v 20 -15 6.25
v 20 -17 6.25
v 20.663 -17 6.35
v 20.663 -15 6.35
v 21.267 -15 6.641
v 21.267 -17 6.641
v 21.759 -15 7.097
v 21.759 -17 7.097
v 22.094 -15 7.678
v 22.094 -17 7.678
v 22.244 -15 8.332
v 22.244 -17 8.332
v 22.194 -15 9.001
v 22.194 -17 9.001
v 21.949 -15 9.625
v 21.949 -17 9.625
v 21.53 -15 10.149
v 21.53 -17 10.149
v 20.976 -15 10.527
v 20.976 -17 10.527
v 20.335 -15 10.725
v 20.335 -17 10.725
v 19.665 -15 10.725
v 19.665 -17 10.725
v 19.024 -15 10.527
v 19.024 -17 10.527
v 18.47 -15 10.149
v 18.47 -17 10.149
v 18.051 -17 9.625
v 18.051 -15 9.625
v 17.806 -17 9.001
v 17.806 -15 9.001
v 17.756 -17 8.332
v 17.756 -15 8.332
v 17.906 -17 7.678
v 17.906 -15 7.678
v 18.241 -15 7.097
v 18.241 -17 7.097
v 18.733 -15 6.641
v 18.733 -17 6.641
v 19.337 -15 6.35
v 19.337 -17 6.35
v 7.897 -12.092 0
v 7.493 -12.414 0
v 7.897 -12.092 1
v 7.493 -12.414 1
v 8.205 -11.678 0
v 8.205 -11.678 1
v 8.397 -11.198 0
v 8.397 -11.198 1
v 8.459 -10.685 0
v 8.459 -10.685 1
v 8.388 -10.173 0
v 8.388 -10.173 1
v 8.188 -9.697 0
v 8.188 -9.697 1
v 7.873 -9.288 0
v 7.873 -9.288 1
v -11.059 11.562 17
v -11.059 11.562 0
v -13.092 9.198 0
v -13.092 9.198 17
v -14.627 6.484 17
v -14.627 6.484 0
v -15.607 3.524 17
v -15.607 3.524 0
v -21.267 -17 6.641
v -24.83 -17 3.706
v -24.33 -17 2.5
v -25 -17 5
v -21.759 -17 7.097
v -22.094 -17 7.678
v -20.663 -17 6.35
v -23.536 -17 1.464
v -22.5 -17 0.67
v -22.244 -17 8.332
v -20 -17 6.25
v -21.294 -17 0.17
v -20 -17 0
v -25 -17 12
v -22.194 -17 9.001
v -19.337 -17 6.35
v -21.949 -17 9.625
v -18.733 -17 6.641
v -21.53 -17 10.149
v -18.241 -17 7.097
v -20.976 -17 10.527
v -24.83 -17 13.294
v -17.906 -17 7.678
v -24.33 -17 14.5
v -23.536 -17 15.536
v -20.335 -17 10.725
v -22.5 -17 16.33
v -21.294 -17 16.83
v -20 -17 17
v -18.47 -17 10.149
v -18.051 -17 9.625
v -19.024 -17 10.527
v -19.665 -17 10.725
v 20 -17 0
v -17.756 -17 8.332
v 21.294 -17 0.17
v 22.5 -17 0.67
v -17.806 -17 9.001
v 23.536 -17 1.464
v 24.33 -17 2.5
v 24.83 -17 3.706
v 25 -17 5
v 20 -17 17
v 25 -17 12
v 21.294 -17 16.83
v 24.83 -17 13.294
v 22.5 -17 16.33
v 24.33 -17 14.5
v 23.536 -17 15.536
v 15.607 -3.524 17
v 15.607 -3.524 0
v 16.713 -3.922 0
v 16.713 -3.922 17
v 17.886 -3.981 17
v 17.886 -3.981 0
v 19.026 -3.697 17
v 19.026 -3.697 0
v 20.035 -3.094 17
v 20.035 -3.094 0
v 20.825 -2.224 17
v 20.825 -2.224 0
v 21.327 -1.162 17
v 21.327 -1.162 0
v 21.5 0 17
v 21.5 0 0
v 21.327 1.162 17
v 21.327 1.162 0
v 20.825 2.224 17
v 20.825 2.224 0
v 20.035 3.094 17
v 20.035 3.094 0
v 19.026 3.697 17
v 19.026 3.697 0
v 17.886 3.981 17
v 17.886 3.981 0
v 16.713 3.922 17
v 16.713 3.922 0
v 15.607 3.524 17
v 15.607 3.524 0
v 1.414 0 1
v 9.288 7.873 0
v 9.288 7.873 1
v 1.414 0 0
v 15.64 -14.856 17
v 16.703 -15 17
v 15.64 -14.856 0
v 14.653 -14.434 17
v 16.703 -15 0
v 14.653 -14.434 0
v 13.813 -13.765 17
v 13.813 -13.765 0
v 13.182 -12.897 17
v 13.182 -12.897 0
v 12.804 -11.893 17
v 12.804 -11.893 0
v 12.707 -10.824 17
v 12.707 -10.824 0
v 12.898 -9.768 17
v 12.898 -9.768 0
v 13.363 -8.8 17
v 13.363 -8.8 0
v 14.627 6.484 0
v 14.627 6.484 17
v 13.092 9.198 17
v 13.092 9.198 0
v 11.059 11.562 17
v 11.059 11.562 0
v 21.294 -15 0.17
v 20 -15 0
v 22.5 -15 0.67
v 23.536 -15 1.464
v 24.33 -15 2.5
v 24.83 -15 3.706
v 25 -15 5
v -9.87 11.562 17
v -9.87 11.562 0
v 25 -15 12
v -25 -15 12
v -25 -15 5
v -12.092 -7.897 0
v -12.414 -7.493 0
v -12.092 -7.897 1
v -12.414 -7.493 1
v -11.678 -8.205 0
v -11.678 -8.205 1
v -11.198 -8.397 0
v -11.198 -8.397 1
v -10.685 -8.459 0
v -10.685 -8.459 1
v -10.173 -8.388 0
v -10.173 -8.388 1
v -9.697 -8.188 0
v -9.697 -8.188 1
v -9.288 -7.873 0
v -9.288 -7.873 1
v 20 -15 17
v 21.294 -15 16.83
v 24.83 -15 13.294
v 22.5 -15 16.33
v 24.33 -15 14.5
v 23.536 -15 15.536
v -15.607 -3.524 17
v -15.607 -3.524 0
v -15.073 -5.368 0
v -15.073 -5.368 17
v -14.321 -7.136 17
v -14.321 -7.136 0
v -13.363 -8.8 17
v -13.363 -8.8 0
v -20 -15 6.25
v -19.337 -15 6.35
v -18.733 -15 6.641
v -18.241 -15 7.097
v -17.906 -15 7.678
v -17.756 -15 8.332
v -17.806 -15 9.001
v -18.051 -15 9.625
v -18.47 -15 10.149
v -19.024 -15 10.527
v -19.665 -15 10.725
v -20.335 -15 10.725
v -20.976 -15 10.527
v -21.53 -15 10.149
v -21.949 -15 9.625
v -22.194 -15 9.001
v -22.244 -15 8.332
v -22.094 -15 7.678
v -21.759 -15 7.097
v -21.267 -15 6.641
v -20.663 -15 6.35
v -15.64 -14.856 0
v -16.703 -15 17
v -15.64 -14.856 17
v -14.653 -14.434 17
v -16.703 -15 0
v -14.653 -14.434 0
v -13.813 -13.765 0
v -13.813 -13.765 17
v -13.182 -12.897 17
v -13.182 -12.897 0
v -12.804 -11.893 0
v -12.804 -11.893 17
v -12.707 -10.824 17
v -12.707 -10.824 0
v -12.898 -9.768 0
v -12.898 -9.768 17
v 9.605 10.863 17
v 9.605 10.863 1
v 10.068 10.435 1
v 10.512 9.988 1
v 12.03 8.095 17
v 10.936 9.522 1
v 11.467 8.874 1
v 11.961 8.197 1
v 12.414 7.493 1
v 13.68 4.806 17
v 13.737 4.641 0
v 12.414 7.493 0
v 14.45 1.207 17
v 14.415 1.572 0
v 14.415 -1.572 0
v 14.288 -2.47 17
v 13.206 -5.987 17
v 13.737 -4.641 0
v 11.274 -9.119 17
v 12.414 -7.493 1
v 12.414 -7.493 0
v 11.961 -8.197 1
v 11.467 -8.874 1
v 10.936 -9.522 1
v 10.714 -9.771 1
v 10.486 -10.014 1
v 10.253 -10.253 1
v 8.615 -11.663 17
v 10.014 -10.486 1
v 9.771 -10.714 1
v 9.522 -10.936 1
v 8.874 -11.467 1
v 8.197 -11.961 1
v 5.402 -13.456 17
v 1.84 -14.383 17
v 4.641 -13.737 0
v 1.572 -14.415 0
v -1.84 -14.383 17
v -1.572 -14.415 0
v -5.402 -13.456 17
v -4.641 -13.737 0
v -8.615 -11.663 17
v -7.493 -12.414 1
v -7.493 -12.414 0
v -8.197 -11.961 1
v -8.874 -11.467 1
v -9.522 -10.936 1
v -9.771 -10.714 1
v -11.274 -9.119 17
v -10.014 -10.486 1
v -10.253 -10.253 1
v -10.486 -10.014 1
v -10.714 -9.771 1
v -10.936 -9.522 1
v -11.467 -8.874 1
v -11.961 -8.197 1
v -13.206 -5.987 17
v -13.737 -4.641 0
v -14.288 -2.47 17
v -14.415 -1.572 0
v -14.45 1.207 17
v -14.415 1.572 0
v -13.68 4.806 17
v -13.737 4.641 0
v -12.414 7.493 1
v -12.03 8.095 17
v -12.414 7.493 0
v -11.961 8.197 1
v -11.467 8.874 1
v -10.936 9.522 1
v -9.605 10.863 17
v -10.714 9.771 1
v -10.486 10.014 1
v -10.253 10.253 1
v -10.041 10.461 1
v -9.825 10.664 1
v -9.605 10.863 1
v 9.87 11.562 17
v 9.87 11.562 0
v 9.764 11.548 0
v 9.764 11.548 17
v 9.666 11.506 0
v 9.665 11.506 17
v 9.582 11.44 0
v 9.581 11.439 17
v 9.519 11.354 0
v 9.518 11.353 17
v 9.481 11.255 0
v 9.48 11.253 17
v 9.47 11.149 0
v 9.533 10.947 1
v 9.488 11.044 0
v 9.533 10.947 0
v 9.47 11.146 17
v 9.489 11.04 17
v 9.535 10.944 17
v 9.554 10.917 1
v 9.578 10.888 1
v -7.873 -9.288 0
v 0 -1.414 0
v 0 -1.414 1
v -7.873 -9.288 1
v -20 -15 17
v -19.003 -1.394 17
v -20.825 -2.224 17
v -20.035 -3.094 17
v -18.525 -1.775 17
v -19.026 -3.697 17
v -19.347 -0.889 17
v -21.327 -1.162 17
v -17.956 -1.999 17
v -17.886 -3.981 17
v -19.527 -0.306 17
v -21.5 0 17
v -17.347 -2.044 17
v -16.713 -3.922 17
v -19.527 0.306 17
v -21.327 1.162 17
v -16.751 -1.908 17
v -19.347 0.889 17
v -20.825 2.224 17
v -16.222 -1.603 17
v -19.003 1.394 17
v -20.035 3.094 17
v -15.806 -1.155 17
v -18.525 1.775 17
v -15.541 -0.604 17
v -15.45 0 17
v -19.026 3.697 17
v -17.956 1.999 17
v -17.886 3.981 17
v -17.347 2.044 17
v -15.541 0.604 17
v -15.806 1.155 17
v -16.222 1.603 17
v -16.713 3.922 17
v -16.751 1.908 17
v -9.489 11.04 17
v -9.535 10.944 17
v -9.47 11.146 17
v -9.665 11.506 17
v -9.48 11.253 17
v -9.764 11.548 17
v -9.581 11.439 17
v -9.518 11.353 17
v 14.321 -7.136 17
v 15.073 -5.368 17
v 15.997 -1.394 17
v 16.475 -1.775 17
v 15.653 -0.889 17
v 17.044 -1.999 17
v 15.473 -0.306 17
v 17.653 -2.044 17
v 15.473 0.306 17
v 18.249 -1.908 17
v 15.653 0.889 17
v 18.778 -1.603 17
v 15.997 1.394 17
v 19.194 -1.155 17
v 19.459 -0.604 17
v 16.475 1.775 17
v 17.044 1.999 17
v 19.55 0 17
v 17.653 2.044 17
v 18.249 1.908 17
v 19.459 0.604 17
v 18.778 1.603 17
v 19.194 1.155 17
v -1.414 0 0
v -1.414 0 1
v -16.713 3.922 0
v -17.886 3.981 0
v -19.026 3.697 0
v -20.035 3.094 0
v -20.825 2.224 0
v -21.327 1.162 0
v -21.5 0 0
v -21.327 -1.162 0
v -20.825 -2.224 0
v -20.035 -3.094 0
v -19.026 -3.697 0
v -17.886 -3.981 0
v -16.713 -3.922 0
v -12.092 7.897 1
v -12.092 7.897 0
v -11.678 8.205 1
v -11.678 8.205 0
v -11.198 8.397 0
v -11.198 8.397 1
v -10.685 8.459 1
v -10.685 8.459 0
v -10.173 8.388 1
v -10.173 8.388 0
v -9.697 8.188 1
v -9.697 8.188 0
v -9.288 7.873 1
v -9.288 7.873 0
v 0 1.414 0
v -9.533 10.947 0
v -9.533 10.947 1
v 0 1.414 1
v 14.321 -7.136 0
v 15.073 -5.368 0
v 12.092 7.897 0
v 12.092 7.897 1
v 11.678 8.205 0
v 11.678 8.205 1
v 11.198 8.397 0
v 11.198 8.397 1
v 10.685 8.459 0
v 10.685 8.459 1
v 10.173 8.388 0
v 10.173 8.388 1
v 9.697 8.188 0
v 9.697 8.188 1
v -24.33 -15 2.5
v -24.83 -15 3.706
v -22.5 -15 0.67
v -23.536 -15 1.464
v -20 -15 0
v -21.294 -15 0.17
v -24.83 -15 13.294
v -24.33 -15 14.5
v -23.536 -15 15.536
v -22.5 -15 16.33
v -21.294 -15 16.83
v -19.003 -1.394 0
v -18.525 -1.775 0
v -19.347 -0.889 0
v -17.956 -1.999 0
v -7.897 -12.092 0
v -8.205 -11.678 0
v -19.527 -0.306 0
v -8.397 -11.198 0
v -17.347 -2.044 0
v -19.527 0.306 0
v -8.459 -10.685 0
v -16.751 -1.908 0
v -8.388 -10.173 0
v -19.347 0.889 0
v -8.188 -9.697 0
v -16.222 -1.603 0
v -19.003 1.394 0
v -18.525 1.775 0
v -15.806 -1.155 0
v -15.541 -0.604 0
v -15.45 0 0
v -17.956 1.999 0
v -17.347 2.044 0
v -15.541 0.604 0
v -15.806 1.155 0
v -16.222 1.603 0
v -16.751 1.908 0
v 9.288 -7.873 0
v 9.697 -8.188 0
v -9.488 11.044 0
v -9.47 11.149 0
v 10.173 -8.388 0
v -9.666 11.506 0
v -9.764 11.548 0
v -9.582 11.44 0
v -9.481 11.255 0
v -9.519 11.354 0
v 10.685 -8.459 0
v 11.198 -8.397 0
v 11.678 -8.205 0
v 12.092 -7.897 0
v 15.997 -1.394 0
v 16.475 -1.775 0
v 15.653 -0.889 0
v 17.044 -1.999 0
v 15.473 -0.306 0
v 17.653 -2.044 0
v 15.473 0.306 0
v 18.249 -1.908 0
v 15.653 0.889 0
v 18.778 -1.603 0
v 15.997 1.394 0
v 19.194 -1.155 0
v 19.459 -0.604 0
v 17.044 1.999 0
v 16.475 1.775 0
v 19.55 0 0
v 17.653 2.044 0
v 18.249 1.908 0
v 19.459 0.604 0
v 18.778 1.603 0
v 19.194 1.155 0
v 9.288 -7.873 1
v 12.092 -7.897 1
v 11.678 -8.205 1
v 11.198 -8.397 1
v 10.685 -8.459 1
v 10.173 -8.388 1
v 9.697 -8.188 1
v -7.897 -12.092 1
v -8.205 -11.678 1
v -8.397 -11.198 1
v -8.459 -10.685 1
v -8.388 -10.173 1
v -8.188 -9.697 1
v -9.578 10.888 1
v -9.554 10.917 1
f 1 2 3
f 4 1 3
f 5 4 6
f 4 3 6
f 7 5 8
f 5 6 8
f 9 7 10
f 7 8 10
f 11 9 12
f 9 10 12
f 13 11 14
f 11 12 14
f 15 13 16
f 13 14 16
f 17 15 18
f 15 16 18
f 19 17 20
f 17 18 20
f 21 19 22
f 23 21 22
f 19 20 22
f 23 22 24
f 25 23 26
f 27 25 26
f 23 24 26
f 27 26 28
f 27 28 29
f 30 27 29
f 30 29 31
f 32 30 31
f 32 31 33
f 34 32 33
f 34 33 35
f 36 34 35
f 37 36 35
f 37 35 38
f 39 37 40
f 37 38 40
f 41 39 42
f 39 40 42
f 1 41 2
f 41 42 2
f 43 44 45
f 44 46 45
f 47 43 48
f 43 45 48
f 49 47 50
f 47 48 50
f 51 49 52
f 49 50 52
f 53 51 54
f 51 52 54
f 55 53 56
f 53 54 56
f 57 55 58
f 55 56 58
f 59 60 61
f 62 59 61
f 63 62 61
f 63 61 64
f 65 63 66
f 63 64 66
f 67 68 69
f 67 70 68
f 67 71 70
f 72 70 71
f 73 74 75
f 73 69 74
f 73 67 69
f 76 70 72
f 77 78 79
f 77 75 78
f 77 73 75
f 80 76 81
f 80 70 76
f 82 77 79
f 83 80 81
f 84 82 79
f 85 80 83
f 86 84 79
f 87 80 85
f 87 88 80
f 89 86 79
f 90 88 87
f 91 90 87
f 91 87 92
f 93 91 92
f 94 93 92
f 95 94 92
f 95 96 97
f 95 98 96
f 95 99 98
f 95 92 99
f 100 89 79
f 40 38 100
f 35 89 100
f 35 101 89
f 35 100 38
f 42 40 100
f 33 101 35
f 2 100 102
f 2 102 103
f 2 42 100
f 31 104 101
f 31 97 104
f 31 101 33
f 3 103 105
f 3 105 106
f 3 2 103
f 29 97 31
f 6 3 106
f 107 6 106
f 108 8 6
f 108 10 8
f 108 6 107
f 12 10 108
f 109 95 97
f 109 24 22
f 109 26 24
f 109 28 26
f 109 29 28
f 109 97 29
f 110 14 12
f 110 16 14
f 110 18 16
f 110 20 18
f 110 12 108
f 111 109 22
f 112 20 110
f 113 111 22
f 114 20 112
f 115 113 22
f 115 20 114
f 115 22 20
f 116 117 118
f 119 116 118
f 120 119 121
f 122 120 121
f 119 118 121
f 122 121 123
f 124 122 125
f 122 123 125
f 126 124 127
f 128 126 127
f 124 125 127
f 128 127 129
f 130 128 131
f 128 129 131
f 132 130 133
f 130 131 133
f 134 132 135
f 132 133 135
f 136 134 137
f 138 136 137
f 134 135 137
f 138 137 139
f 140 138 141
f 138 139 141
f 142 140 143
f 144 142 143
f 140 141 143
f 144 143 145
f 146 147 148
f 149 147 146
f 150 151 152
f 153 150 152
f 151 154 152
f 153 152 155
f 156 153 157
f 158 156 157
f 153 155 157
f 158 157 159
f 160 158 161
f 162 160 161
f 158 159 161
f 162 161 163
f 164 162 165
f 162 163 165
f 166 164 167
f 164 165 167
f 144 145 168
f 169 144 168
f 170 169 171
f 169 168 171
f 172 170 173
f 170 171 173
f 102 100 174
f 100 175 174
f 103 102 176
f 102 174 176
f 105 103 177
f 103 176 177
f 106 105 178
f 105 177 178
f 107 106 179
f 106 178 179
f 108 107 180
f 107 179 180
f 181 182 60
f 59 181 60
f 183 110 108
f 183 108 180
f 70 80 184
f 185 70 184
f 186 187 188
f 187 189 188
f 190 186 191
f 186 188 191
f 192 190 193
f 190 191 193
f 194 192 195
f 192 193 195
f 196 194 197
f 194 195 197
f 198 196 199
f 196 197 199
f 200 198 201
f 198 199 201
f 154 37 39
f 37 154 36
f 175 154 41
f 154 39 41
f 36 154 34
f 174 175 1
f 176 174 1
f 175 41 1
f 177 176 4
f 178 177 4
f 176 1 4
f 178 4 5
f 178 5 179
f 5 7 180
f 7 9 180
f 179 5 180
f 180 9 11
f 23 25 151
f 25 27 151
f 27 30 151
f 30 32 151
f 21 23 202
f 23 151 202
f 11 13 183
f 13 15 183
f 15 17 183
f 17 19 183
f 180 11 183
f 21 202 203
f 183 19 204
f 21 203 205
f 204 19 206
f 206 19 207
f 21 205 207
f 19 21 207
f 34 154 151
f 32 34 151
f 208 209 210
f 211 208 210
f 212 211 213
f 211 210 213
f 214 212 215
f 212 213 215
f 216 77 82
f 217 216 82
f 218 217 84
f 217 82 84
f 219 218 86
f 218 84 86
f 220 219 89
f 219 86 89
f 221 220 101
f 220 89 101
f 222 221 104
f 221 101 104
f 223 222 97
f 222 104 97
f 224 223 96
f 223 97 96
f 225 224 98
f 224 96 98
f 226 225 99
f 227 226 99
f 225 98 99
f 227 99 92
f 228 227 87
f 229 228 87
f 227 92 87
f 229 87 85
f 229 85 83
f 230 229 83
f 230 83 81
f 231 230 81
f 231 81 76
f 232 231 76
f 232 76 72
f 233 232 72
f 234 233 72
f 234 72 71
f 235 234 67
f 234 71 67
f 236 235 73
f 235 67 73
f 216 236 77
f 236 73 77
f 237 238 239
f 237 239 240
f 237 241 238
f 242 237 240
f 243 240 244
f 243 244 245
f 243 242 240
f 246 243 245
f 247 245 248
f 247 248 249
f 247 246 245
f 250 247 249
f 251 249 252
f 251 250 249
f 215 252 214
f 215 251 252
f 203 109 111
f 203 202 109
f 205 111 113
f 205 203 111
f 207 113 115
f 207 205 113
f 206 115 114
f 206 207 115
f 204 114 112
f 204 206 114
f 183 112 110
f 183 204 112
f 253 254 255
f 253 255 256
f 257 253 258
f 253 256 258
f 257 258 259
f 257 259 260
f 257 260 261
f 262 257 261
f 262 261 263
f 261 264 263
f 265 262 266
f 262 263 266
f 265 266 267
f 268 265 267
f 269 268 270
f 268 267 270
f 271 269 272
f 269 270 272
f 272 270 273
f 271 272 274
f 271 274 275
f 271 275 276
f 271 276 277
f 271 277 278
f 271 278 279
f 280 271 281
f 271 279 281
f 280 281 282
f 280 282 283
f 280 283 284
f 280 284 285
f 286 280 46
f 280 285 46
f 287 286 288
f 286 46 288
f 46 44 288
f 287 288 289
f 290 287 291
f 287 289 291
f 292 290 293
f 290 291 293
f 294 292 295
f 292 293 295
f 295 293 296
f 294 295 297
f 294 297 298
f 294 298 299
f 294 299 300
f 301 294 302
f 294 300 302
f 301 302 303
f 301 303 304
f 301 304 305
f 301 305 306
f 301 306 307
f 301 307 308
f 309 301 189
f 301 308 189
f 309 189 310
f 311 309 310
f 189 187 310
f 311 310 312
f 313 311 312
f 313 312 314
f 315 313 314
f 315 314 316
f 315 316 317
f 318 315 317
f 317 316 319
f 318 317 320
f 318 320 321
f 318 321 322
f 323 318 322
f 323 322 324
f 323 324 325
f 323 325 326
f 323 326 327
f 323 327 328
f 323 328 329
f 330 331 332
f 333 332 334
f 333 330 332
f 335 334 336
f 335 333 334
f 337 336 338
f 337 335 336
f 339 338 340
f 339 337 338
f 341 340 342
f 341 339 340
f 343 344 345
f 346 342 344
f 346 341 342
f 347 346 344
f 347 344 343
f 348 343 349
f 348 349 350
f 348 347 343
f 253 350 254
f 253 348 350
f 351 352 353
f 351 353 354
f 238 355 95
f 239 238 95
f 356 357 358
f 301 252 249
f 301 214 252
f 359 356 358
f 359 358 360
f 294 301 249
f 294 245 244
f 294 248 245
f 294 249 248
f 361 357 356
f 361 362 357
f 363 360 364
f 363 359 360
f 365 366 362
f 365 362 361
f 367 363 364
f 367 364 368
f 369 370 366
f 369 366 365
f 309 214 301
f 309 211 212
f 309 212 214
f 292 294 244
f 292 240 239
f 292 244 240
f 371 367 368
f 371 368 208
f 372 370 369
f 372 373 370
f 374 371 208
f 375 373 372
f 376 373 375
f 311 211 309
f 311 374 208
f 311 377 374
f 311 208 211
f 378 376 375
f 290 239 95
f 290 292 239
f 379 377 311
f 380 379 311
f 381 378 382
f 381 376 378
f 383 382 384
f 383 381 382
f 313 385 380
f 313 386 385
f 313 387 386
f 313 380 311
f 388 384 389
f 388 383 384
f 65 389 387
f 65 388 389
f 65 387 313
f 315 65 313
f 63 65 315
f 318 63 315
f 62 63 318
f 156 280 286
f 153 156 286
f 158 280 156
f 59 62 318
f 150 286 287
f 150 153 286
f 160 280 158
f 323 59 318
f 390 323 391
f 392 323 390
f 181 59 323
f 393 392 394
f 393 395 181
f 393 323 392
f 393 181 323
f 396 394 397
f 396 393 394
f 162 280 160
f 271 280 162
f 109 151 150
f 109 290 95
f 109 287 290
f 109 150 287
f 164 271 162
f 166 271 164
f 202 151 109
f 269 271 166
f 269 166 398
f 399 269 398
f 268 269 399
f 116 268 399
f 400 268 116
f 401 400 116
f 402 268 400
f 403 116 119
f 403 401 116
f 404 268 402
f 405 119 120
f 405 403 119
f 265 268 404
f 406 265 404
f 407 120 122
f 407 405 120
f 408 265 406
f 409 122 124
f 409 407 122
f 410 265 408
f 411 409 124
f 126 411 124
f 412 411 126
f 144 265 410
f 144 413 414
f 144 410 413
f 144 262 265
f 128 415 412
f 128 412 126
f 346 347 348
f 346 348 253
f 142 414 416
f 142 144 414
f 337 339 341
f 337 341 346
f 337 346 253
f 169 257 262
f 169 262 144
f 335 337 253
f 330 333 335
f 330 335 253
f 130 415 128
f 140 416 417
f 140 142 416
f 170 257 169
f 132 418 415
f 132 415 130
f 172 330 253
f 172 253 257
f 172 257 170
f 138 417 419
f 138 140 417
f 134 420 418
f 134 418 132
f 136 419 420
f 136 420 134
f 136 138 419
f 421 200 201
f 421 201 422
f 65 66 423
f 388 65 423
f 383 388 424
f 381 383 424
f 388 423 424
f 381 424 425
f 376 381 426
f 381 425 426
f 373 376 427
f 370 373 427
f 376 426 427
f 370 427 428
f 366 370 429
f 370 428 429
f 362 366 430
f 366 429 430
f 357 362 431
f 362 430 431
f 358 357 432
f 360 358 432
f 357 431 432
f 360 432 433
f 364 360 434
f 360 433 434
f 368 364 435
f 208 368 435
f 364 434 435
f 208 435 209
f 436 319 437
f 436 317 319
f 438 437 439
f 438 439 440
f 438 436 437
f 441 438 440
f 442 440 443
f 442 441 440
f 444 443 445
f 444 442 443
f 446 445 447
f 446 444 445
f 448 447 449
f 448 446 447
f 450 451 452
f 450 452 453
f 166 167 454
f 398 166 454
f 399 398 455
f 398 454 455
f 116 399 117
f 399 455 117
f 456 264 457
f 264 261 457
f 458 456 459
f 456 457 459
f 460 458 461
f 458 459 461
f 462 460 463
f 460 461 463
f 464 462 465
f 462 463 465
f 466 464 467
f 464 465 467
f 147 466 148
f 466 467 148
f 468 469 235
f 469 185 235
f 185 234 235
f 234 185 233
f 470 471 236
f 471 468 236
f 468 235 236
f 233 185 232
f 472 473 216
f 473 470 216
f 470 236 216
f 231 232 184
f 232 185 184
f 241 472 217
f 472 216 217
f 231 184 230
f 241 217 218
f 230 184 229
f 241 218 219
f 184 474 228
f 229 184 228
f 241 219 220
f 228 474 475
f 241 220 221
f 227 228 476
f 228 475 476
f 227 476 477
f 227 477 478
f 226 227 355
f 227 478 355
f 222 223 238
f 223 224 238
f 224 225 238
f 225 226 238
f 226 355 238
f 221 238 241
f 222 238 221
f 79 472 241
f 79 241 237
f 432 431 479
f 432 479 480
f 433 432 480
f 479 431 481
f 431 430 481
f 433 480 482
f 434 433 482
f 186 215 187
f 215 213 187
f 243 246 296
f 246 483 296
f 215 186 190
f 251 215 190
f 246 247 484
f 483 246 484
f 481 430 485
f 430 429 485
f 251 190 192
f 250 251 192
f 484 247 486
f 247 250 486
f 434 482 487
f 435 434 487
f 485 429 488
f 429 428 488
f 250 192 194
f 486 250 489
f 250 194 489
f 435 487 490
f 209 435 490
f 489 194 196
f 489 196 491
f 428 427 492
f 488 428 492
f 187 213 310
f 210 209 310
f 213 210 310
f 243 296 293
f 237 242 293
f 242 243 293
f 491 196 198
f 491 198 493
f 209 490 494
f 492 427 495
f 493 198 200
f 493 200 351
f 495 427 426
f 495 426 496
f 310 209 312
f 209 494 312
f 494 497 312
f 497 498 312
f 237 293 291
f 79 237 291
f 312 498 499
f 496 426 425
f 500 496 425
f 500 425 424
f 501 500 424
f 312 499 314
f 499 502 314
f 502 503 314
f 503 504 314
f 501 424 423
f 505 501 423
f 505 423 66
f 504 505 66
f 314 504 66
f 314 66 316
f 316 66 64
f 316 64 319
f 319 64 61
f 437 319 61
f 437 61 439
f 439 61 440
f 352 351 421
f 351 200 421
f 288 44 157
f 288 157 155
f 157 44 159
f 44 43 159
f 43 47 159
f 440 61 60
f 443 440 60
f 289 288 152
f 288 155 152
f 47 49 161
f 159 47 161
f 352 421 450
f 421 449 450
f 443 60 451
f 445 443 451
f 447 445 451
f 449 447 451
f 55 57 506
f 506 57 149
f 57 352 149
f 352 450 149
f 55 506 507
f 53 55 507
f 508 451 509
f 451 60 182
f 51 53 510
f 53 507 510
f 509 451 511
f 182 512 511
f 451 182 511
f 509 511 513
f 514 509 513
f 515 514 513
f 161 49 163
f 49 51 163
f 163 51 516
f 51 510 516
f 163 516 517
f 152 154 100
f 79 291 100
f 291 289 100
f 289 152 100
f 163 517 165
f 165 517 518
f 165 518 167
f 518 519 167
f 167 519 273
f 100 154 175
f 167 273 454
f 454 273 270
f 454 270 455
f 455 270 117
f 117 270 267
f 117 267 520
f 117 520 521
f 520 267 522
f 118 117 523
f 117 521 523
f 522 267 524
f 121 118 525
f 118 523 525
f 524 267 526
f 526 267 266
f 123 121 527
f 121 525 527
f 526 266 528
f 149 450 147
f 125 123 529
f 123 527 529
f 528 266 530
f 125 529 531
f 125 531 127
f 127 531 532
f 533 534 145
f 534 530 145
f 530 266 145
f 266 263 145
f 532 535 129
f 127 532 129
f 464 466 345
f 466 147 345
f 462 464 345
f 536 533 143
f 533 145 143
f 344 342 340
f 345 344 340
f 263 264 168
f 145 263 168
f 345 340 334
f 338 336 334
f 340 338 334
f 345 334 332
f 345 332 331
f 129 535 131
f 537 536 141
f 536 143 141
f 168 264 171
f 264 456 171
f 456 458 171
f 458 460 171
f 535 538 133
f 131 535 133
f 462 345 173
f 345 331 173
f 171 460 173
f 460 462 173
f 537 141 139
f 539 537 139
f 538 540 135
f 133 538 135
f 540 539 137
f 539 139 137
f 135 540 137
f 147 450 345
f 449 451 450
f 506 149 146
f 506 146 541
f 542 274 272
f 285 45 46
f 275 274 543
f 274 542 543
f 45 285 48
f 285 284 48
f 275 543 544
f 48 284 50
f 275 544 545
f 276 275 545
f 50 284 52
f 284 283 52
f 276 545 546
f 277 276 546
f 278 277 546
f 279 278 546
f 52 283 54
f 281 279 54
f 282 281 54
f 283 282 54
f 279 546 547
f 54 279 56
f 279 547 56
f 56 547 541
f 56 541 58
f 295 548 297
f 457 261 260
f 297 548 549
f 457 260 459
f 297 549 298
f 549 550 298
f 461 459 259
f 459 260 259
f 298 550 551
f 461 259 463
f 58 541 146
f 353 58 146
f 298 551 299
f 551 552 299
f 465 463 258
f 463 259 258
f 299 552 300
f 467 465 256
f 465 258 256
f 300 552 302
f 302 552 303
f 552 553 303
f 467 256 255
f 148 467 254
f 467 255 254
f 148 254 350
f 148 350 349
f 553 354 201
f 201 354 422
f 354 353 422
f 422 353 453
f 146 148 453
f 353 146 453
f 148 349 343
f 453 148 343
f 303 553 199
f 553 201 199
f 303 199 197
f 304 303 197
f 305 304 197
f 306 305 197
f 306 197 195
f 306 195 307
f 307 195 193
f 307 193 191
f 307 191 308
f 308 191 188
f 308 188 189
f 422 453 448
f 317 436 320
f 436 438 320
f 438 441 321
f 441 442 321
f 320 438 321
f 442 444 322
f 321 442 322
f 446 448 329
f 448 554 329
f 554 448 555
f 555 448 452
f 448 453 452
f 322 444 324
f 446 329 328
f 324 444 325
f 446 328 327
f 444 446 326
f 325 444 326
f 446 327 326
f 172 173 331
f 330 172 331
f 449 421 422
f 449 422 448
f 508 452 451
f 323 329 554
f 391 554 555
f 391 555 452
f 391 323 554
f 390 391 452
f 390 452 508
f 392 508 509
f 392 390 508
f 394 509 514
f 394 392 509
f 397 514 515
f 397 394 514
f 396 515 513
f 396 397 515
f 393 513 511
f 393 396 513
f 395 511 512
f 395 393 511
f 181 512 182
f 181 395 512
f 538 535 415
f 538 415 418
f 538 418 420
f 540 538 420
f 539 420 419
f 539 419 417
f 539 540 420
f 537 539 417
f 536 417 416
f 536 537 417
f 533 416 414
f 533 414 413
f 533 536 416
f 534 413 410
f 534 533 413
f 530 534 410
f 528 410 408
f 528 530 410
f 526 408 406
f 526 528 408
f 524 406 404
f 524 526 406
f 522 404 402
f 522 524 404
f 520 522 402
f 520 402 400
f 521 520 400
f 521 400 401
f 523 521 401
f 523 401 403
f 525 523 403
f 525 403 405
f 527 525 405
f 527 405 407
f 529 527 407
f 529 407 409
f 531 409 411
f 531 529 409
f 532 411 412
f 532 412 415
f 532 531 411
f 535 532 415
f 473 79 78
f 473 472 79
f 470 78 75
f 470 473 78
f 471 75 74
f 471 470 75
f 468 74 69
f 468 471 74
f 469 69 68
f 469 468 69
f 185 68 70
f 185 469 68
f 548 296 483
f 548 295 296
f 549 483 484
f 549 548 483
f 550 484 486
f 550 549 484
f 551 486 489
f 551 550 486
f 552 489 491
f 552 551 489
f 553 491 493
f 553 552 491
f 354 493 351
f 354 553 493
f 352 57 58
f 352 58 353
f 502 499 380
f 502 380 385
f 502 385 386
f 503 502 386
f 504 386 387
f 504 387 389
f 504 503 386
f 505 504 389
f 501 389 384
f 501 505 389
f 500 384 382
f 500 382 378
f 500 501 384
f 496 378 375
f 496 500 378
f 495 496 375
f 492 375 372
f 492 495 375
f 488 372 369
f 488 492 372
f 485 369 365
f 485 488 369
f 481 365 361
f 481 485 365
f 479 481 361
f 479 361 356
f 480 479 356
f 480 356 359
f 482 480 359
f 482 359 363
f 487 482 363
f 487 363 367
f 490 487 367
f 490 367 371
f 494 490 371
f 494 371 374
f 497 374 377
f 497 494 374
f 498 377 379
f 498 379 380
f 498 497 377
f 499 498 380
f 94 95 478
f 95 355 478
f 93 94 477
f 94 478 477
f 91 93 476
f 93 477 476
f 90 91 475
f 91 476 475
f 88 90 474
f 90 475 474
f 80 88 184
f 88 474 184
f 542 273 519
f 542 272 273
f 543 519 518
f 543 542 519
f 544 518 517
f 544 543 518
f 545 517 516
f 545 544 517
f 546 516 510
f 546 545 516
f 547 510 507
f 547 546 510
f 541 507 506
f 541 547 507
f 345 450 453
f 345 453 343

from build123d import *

# Parameters (mm, degrees)
ESQUISSE1_R             = 2.05
BOSS_EXTRU_2_DEPTH      = 17
ESQUISSE2_W             = 50
ESQUISSE2_H             = 2
BOSS_EXTRU_3_DEPTH      = 17
CONG_2_R                = 4
BOSS_EXTRU_4_DEPTH      = 1
CONG_3_R                = 0.4
CONG_4_R                = 2
ESQUISSE5_R             = 2.25
ENL_V_MAT_EXTRU_1_DEPTH = 2
CONG_5_R                = 5


with BuildPart() as part:
    # Esquisse1 → Boss.-Extru.2 (new body)
    with BuildSketch(Plane.XY):
        with BuildLine():
            Line((-8.75, 11.56233108), (-11.05949818, 11.56233108))
            ThreePointArc((-11.05949818, 11.56233108), (-13.925946075, 7.87832634), (-15.607142857, 3.523789414))
            ThreePointArc((-15.607142857, 3.523789414), (-21.5, 0), (-15.607142857, -3.523789414))
            ThreePointArc((-15.607142857, -3.523789414), (0, -16), (15.607142857, -3.523789414))
            ThreePointArc((15.607142857, -3.523789414), (21.5, 0), (15.607142857, 3.523789414))
            ThreePointArc((15.607142857, 3.523789414), (13.925946075, 7.87832634), (11.05949818, 11.56233108))
            Line((11.05949818, 11.56233108), (8.75, 11.56233108))
            ThreePointArc((8.75, 11.56233108), (0, -14.5), (-8.75, 11.56233108))
        make_face()
        with Locations((-17.5, 0)):
            Circle(ESQUISSE1_R, mode=Mode.SUBTRACT)
        with Locations((17.5, 0)):
            Circle(ESQUISSE1_R, mode=Mode.SUBTRACT)
    extrude(amount=BOSS_EXTRU_2_DEPTH)

    # Esquisse2 → Boss.-Extru.3 (add)
    with BuildSketch(Plane.XY.offset(17)):
        with Locations((0, -16)):
            Rectangle(ESQUISSE2_W, ESQUISSE2_H)
    extrude(amount=-BOSS_EXTRU_3_DEPTH)

    # Congé2
    cong_2_edges = [part.edges().sort_by_distance(p)[0] for p in [
        (5.567764363, -15, 8.5),
        (-5.567764363, -15, 8.5),
    ]]
    fillet(cong_2_edges, radius=CONG_2_R)

    # Esquisse4 → Boss.-Extru.4 (add)
    with BuildSketch(Plane(origin=(0, 0, 0), x_dir=(-1, 0, 0), z_dir=(0, 0, -1))):
        with BuildLine():
            Line((-1.414213562, 0), (-10.935743054, -9.521529492))
            ThreePointArc((-10.935743054, -9.521529492), (-10.600707524, -9.893179469), (-10.253048327, -10.253048327))
            ThreePointArc((-10.253048327, -10.253048327), (-9.893179469, -10.600707524), (-9.521529492, -10.935743054))
            Line((-9.521529492, -10.935743054), (0, -1.414213562))
            Line((0, -1.414213562), (9.521529492, -10.935743054))
            ThreePointArc((9.521529492, -10.935743054), (9.893179469, -10.600707524), (10.253048327, -10.253048327))
            ThreePointArc((10.253048327, -10.253048327), (10.600707524, -9.893179469), (10.935743054, -9.521529492))
            Line((10.935743054, -9.521529492), (1.414213562, 0))
            Line((1.414213562, 0), (10.935743054, 9.521529492))
            ThreePointArc((10.935743054, 9.521529492), (10.600707524, 9.893179469), (10.253048327, 10.253048327))
            ThreePointArc((10.253048327, 10.253048327), (9.893179469, 10.600707524), (9.521529492, 10.935743054))
            Line((9.521529492, 10.935743054), (0, 1.414213562))
            Line((0, 1.414213562), (-9.521529492, 10.935743054))
            ThreePointArc((-9.521529492, 10.935743054), (-10.253048327, 10.253048327), (-10.935743054, 9.521529492))
            Line((-10.935743054, 9.521529492), (-1.414213562, 0))
        make_face()
    extrude(amount=-BOSS_EXTRU_4_DEPTH)

    # Congé3
    cong_3_edges = [part.edges().sort_by_distance(p)[0] for p in [
        (-8.75, 11.56233108, 8.5),
        (8.75, 11.56233108, 8.5),
    ]]
    fillet(cong_3_edges, radius=CONG_3_R)

    # Congé4
    cong_4_edges = [part.edges().sort_by_distance(p)[0] for p in [
        (-10.935743054, -9.521529492, 0.5),
        (-9.521529492, -10.935743054, 0.5),
        (9.521529492, -10.935743054, 0.5),
        (10.935743054, -9.521529492, 0.5),
        (10.935743054, 9.521529492, 0.5),
        (-10.935743054, 9.521529492, 0.5),
    ]]
    fillet(cong_4_edges, radius=CONG_4_R)

    # Esquisse5 → Enlèv. mat.-Extru.1 (cut)
    with BuildSketch(Plane.XZ.offset(17)):
        with Locations(Location((-20, 8.5, 0), (0, 0, 270))):
            Circle(ESQUISSE5_R)
        with Locations(Location((20, 8.5, 0), (0, 0, 270))):
            Circle(ESQUISSE5_R)
    extrude(amount=-ENL_V_MAT_EXTRU_1_DEPTH, mode=Mode.SUBTRACT)

    # Congé5
    cong_5_edges = [part.edges().sort_by_distance(p)[0] for p in [
        (-25, -16, 17),
        (25, -16, 17),
        (-25, -16, 0),
        (25, -16, 0),
    ]]
    fillet(cong_5_edges, radius=CONG_5_R)


solid = part.part
